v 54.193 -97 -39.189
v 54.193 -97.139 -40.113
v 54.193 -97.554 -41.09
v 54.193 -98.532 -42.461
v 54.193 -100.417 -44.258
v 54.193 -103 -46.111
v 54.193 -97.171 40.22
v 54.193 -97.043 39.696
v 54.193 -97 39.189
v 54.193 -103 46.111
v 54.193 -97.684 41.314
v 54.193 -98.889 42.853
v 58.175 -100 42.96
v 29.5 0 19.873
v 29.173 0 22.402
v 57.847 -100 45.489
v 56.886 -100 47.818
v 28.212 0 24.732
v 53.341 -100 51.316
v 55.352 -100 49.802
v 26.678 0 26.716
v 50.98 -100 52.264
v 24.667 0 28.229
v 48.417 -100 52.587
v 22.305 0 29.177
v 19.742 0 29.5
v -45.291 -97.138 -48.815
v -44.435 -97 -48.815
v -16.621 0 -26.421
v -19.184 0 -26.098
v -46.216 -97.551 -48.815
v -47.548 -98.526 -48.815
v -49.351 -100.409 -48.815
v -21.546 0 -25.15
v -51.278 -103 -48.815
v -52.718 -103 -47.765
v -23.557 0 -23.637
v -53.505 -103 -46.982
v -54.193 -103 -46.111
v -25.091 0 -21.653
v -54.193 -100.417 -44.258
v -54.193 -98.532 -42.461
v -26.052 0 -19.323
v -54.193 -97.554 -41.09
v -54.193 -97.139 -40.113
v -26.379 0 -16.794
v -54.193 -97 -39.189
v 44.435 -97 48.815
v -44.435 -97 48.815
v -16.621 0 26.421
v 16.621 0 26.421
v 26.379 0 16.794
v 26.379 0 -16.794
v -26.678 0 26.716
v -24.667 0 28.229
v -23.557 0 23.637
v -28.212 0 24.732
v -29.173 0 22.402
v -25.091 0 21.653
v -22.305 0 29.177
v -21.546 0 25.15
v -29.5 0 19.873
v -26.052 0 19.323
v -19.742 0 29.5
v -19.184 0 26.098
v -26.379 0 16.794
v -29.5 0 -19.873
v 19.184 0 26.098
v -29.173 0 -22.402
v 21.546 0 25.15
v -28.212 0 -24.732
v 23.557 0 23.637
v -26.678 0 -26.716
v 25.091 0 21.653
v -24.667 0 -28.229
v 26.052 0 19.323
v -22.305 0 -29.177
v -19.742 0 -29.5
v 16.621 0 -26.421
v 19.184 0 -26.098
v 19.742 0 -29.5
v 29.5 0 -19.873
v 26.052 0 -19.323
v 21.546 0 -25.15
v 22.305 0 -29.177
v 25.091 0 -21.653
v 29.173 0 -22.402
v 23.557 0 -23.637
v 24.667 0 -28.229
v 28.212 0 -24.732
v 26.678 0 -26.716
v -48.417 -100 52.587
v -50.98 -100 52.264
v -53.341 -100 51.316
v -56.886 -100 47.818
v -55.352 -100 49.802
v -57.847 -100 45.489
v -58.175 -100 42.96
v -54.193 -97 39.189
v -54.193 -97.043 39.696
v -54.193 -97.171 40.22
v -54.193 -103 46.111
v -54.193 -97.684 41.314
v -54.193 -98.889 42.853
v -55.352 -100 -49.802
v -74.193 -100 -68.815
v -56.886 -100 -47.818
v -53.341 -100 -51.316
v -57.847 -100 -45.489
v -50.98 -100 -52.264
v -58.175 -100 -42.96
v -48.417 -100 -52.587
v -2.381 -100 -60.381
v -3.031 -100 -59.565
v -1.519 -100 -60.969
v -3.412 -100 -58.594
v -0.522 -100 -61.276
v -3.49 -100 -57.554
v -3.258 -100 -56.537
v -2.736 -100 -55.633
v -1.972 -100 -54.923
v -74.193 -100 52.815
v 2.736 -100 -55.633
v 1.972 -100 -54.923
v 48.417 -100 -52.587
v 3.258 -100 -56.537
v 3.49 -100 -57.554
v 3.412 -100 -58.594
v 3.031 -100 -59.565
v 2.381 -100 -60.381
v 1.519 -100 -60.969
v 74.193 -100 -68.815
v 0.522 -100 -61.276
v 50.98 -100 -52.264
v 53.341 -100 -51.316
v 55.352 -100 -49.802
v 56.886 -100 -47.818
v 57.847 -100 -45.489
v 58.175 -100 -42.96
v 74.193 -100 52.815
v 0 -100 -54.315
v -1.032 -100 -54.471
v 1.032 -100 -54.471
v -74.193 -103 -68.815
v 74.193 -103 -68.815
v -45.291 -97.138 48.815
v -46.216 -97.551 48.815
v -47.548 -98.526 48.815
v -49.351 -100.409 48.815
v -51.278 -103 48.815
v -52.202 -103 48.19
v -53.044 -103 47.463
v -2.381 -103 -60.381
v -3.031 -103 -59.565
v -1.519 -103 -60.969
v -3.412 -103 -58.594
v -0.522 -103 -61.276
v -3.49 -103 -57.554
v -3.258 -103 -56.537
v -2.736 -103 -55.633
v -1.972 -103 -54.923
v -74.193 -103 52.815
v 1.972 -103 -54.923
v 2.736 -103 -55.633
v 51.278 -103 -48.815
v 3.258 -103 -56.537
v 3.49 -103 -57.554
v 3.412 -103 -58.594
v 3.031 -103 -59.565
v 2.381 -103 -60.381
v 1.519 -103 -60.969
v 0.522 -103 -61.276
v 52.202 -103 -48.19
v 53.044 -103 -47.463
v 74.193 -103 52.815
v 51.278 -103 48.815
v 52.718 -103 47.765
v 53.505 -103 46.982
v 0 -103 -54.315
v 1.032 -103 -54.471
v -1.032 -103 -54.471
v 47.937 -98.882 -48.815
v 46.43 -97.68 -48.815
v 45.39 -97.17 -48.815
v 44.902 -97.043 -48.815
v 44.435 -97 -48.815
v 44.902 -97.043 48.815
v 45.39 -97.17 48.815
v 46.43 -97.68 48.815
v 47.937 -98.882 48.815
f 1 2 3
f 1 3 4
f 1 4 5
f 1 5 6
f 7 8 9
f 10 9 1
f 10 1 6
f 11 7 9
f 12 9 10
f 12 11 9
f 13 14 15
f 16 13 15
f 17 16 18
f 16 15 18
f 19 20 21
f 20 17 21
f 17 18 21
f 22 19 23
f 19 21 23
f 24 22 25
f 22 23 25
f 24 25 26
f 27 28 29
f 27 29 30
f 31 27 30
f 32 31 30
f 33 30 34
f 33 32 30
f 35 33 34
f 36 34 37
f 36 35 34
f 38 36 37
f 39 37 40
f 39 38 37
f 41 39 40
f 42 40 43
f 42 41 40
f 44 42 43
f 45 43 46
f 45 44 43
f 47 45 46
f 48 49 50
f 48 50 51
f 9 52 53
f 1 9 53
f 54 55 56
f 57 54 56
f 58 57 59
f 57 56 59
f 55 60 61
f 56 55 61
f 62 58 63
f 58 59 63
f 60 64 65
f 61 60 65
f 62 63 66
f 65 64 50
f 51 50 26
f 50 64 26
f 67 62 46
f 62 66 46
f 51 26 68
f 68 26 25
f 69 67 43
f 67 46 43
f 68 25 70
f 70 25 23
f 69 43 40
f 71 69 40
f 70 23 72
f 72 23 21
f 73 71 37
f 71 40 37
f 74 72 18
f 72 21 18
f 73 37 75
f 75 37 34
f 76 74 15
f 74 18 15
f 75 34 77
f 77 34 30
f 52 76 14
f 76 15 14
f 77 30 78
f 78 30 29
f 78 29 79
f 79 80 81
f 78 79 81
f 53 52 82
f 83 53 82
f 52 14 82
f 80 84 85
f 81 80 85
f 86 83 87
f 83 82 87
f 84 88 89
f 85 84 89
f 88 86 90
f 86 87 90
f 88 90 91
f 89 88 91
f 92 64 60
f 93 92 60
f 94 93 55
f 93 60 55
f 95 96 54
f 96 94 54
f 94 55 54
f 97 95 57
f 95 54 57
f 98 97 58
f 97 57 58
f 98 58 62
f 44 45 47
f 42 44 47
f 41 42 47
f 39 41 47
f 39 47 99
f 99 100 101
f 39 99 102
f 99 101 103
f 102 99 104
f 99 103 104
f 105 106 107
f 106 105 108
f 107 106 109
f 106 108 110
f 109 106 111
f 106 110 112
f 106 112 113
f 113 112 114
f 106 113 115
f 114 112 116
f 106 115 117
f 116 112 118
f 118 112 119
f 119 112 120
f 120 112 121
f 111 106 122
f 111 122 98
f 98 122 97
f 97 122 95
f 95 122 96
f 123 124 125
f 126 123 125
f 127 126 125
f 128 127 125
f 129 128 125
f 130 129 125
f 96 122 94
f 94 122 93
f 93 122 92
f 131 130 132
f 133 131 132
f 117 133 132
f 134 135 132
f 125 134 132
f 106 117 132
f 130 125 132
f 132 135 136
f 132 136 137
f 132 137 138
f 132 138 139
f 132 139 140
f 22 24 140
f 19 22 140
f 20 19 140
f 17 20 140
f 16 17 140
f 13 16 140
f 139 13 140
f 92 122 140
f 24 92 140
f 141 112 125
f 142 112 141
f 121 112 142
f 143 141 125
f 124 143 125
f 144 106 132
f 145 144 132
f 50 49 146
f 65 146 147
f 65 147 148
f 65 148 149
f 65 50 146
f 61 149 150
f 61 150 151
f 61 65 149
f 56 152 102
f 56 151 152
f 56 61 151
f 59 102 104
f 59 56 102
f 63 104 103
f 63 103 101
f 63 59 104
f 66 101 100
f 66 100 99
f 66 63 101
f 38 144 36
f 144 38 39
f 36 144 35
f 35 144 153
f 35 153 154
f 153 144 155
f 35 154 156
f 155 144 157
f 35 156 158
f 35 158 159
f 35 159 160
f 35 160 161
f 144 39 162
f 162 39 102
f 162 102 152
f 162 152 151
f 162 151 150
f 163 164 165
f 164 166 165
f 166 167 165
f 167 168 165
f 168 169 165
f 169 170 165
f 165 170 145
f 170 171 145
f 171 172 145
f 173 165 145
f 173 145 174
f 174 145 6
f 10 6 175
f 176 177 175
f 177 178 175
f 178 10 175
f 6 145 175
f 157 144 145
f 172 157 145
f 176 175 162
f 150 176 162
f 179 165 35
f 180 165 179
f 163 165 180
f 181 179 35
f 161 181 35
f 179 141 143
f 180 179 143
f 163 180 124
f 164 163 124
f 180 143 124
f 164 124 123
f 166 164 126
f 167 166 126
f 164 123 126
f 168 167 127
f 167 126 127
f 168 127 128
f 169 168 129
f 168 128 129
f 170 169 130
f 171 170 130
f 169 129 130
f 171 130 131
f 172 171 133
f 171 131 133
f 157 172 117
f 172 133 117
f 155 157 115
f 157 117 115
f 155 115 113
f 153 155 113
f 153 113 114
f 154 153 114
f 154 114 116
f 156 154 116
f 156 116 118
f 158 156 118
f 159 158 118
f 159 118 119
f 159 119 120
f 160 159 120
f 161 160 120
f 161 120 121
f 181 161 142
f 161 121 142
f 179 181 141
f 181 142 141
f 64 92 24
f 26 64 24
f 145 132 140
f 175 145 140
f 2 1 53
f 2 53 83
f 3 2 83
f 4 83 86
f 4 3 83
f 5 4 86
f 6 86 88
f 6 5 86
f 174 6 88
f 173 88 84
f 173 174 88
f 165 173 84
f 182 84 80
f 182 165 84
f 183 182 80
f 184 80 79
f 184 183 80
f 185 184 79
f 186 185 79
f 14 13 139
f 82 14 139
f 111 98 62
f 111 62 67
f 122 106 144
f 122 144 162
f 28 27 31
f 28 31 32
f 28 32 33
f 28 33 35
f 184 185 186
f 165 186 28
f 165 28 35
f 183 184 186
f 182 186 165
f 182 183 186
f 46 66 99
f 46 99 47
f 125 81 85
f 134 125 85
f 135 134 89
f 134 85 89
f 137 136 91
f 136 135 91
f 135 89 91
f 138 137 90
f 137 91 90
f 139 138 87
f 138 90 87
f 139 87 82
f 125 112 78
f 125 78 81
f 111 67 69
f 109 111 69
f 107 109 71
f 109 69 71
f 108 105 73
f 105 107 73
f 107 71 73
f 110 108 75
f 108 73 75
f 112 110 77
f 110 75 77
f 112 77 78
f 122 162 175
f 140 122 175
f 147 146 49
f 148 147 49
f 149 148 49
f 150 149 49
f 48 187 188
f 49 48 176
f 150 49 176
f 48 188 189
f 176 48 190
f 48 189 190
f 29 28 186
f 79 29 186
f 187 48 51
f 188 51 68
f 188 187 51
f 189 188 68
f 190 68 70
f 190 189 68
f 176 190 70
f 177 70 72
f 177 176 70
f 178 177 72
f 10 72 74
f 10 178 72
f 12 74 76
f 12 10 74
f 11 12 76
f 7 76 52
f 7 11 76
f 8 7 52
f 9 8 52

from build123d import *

# Parameters (mm, degrees)
SKETCH1_W           = 59
SKETCH1_H           = 59
BOSS_EXTRUDE1_DEPTH = 100
DRAFT1_ANGLE        = 13
DRAFT2_ANGLE        = 16
SHELL1_T            = -3
CUT_EXTRUDE3_REACH  = 126.734
SKETCH7_W           = 108.386808222
SKETCH7_H           = 97.630604432
SKETCH8_W           = 148.386808222
SKETCH8_H           = 137.630604432
SKETCH8_W_2         = 108.386808222
SKETCH8_H_2         = 97.630604432
BOSS_EXTRUDE7_DEPTH = 3
FILLET5_R           = 10
SKETCH9_R           = 3.5
CUT_EXTRUDE4_DEPTH  = 3
CUT_EXTRUDE5_REACH  = 146.393
SKETCH10_W          = 148.386808222
SKETCH10_H          = 16


with BuildPart() as part:
    # Sketch1 → Boss-Extrude1 (new body)
    with BuildSketch(Plane(origin=(0, 0, 0), x_dir=(1, 0, 0), z_dir=(0, 1, 0))):
        Rectangle(SKETCH1_W, SKETCH1_H)
    extrude(amount=-BOSS_EXTRUDE1_DEPTH)

    # Draft1
    draft1_faces = [part.faces().sort_by_distance(p)[0] for p in [
        (0, -50, 29.5),
        (0, -50, -29.5),
    ]]
    draft(draft1_faces, Plane.ZX, DRAFT1_ANGLE)

    # Draft2
    draft2_faces = [part.faces().sort_by_distance(p)[0] for p in [
        (-29.5, -54.687479947, 0),
        (29.5, -54.687479947, 0),
    ]]
    draft(draft2_faces, Plane.ZX, DRAFT2_ANGLE)

    # Shell1
    shell1_openings = [part.faces().sort_by_distance(p)[0] for p in [
        (0, 0, 0),
    ]]
    offset(amount=SHELL1_T, openings=shell1_openings, kind=Kind.INTERSECTION)

    # Sketch7 → Cut-Extrude3 (cut, up to next)
    with BuildSketch(Plane(origin=(0, -97, 0), x_dir=(1, 0, 0), z_dir=(0, 1, 0)), mode=Mode.PRIVATE) as cut_extrude3_sk1:
        Rectangle(SKETCH7_W, SKETCH7_H)
    cut_extrude3_tool1 = extrude(cut_extrude3_sk1.sketch, amount=-CUT_EXTRUDE3_REACH, mode=Mode.PRIVATE) & part.part
    add(cut_extrude3_tool1.solids().sort_by_distance((0, -97, 0))[0], mode=Mode.SUBTRACT)

    # Sketch8 → Boss-Extrude7 (add)
    with BuildSketch(Plane.XZ.offset(100)):
        Rectangle(SKETCH8_W, SKETCH8_H)
        Rectangle(SKETCH8_W_2, SKETCH8_H_2, mode=Mode.SUBTRACT)
    extrude(amount=BOSS_EXTRUDE7_DEPTH)

    # Fillet5
    # the kernel refuses this fillet: 10 mm, written as the material it adds along each edge
    with BuildSketch(Plane(origin=(60.515709798, -119.048500171, 53.905599567), x_dir=(0.05971785506372287, -0.20826091030442337, -0.9762485190901757), z_dir=(-0.26909056042227797, 0.9384303071178944, -0.2166537075017155))) as fillet5_piece_1_section:
        with BuildLine():
            CenterArc((FILLET5_R * 0.939803414436, FILLET5_R), FILLET5_R, 183.554900224, 86.445099776)
            Line((-FILLET5_R * 0.0582724297082, FILLET5_R * 0.937995086192), (0, 0))
            Line((0, 0), (FILLET5_R * 0.939803414436, 0))
        make_face()
    fillet5_piece_1 = extrude(amount=150.354266344, mode=Mode.PRIVATE)
    fillet5_piece_1 = split(fillet5_piece_1, bisect_by=Plane(origin=(38.566536387, -103, 35.845693728), z_dir=(0, 1, 0)), keep=Keep.TOP, mode=Mode.PRIVATE)
    fillet5_piece_1 = split(fillet5_piece_1, bisect_by=Plane(origin=(38.566536387, 0, 35.845693728), z_dir=(0, -1, 0)), keep=Keep.TOP, mode=Mode.PRIVATE)
    add(fillet5_piece_1)
    with BuildSketch(Plane(origin=(60.515709798, -119.048500171, -53.905599567), x_dir=(0.059717855063722874, -0.2082609103044234, 0.9762485190901756), z_dir=(-0.26909056042227797, 0.9384303071178944, 0.2166537075017155))) as fillet5_piece_2_section:
        with BuildLine():
            CenterArc((FILLET5_R * 0.939803414436, -FILLET5_R), FILLET5_R, 90, 86.445099776)
            Line((-FILLET5_R * 0.0582724297082, -FILLET5_R * 0.937995086192), (0, 0))
            Line((0, 0), (FILLET5_R * 0.939803414436, 0))
        make_face()
    fillet5_piece_2 = extrude(amount=150.354266344, mode=Mode.PRIVATE)
    fillet5_piece_2 = split(fillet5_piece_2, bisect_by=Plane(origin=(38.566536387, -103, -35.845693728), z_dir=(0, 1, 0)), keep=Keep.TOP, mode=Mode.PRIVATE)
    fillet5_piece_2 = split(fillet5_piece_2, bisect_by=Plane(origin=(38.566536387, 0, -35.845693728), z_dir=(0, -1, 0)), keep=Keep.TOP, mode=Mode.PRIVATE)
    add(fillet5_piece_2)
    with BuildSketch(Plane(origin=(-60.515709798, -119.048500171, -53.905599567), x_dir=(0.9631148790729092, -0.26219378679175015, -0.06053220528097297), z_dir=(0.26909056042227797, 0.9384303071178944, 0.2166537075017155))) as fillet5_piece_3_section:
        with BuildLine():
            CenterArc((FILLET5_R * 0.939803414436, -FILLET5_R), FILLET5_R, 90, 86.445099776)
            Line((-FILLET5_R * 0.0582724297082, -FILLET5_R * 0.937995086192), (0, 0))
            Line((0, 0), (FILLET5_R * 0.939803414436, 0))
        make_face()
    fillet5_piece_3 = extrude(amount=150.354266344, mode=Mode.PRIVATE)
    fillet5_piece_3 = split(fillet5_piece_3, bisect_by=Plane(origin=(-38.566536387, -103, -35.845693728), z_dir=(0, 1, 0)), keep=Keep.TOP, mode=Mode.PRIVATE)
    fillet5_piece_3 = split(fillet5_piece_3, bisect_by=Plane(origin=(-38.566536387, 0, -35.845693728), z_dir=(0, -1, 0)), keep=Keep.TOP, mode=Mode.PRIVATE)
    add(fillet5_piece_3)
    with BuildSketch(Plane(origin=(-20.056796005, 22.048500171, 21.330790325), x_dir=(-0.059717855063722264, -0.2082609103044235, -0.9762485190901756), z_dir=(-0.26909056042227797, -0.9384303071178944, 0.2166537075017155))) as fillet5_piece_4_section:
        with BuildLine():
            CenterArc((FILLET5_R * 0.939803414436, FILLET5_R), FILLET5_R, 183.554900224, 86.445099776)
            Line((-FILLET5_R * 0.0582724297082, FILLET5_R * 0.937995086192), (0, 0))
            Line((0, 0), (FILLET5_R * 0.939803414436, 0))
        make_face()
    fillet5_piece_4 = extrude(amount=150.354266344, mode=Mode.PRIVATE)
    fillet5_piece_4 = split(fillet5_piece_4, bisect_by=Plane(origin=(-38.566536387, -103, 35.845693728), z_dir=(0, 1, 0)), keep=Keep.TOP, mode=Mode.PRIVATE)
    fillet5_piece_4 = split(fillet5_piece_4, bisect_by=Plane(origin=(-38.566536387, 0, 35.845693728), z_dir=(0, -1, 0)), keep=Keep.TOP, mode=Mode.PRIVATE)
    add(fillet5_piece_4)
    # the kernel refuses this fillet: 10 mm, written as the material it takes off along each edge
    with BuildSketch(Plane(origin=(-23.177694313, 22.048500171, -24.409702648), x_dir=(-0.05971785506372238, -0.20826091030442354, 0.9762485190901757), z_dir=(-0.26909056042227797, -0.9384303071178944, -0.2166537075017155))) as fillet5_2_piece_1_section:
        with BuildLine():
            CenterArc((FILLET5_R * 0.939803414436, -FILLET5_R), FILLET5_R, 90, 86.445099776)
            Line((-FILLET5_R * 0.0582724297082, -FILLET5_R * 0.937995086192), (0, 0))
            Line((0, 0), (FILLET5_R * 0.939803414436, 0))
        make_face()
    fillet5_2_piece_1 = extrude(amount=153.551094044, mode=Mode.PRIVATE)
    fillet5_2_piece_1 = split(fillet5_2_piece_1, bisect_by=Plane(origin=(-41.676990214, -100, -38.91219309), z_dir=(0, 1, 0)), keep=Keep.TOP, mode=Mode.PRIVATE)
    add(fillet5_2_piece_1, mode=Mode.SUBTRACT)
    with BuildSketch(Plane(origin=(23.177694313, 22.048500171, -24.409702648), x_dir=(0.059717855063722375, -0.2082609103044235, 0.9762485190901756), z_dir=(0.26909056042227797, -0.9384303071178944, -0.2166537075017155))) as fillet5_2_piece_2_section:
        with BuildLine():
            CenterArc((FILLET5_R * 0.939803414436, FILLET5_R), FILLET5_R, 183.554900224, 86.445099776)
            Line((-FILLET5_R * 0.0582724297082, FILLET5_R * 0.937995086192), (0, 0))
            Line((0, 0), (FILLET5_R * 0.939803414436, 0))
        make_face()
    fillet5_2_piece_2 = extrude(amount=153.551094044, mode=Mode.PRIVATE)
    fillet5_2_piece_2 = split(fillet5_2_piece_2, bisect_by=Plane(origin=(41.676990214, -100, -38.91219309), z_dir=(0, 1, 0)), keep=Keep.TOP, mode=Mode.PRIVATE)
    add(fillet5_2_piece_2, mode=Mode.SUBTRACT)
    with BuildSketch(Plane(origin=(23.177694313, 22.048500171, 24.409702648), x_dir=(-0.9631148790729092, -0.26219378679175015, 0.06053220528097312), z_dir=(0.26909056042227797, -0.9384303071178944, 0.2166537075017155))) as fillet5_2_piece_3_section:
        with BuildLine():
            CenterArc((FILLET5_R * 0.939803414436, FILLET5_R), FILLET5_R, 183.554900224, 86.445099776)
            Line((-FILLET5_R * 0.0582724297082, FILLET5_R * 0.937995086192), (0, 0))
            Line((0, 0), (FILLET5_R * 0.939803414436, 0))
        make_face()
    fillet5_2_piece_3 = extrude(amount=153.551094044, mode=Mode.PRIVATE)
    fillet5_2_piece_3 = split(fillet5_2_piece_3, bisect_by=Plane(origin=(41.676990214, -100, 38.91219309), z_dir=(0, 1, 0)), keep=Keep.TOP, mode=Mode.PRIVATE)
    add(fillet5_2_piece_3, mode=Mode.SUBTRACT)
    with BuildSketch(Plane(origin=(-23.177694313, 22.048500171, 24.409702648), x_dir=(0.9631148790729092, -0.26219378679175015, 0.06053220528097312), z_dir=(-0.26909056042227797, -0.9384303071178944, 0.2166537075017155))) as fillet5_2_piece_4_section:
        with BuildLine():
            CenterArc((FILLET5_R * 0.939803414436, -FILLET5_R), FILLET5_R, 90, 86.445099776)
            Line((-FILLET5_R * 0.0582724297082, -FILLET5_R * 0.937995086192), (0, 0))
            Line((0, 0), (FILLET5_R * 0.939803414436, 0))
        make_face()
    fillet5_2_piece_4 = extrude(amount=153.551094044, mode=Mode.PRIVATE)
    fillet5_2_piece_4 = split(fillet5_2_piece_4, bisect_by=Plane(origin=(-41.676990214, -100, 38.91219309), z_dir=(0, 1, 0)), keep=Keep.TOP, mode=Mode.PRIVATE)
    add(fillet5_2_piece_4, mode=Mode.SUBTRACT)

    # Sketch9 → Cut-Extrude4 (cut)
    with BuildSketch(Plane(origin=(0, -100, 0), x_dir=(1, 0, 0), z_dir=(0, 1, 0))):
        with Locations(Location((0, 57.815302216, 0), (0, 0, 270))):
            Circle(SKETCH9_R)
    extrude(amount=-CUT_EXTRUDE4_DEPTH, mode=Mode.SUBTRACT)

    # Sketch10 → Cut-Extrude5 (cut, up to next)
    with BuildSketch(Plane.XZ.offset(103), mode=Mode.PRIVATE) as cut_extrude5_sk1:
        with Locations((0, 60.815302216)):
            Rectangle(SKETCH10_W, SKETCH10_H)
    cut_extrude5_tool1 = extrude(cut_extrude5_sk1.sketch, amount=-CUT_EXTRUDE5_REACH, mode=Mode.PRIVATE) & part.part
    add(cut_extrude5_tool1.solids().sort_by_distance((0, -103, 60.815302))[0], mode=Mode.SUBTRACT)


solid = part.part
